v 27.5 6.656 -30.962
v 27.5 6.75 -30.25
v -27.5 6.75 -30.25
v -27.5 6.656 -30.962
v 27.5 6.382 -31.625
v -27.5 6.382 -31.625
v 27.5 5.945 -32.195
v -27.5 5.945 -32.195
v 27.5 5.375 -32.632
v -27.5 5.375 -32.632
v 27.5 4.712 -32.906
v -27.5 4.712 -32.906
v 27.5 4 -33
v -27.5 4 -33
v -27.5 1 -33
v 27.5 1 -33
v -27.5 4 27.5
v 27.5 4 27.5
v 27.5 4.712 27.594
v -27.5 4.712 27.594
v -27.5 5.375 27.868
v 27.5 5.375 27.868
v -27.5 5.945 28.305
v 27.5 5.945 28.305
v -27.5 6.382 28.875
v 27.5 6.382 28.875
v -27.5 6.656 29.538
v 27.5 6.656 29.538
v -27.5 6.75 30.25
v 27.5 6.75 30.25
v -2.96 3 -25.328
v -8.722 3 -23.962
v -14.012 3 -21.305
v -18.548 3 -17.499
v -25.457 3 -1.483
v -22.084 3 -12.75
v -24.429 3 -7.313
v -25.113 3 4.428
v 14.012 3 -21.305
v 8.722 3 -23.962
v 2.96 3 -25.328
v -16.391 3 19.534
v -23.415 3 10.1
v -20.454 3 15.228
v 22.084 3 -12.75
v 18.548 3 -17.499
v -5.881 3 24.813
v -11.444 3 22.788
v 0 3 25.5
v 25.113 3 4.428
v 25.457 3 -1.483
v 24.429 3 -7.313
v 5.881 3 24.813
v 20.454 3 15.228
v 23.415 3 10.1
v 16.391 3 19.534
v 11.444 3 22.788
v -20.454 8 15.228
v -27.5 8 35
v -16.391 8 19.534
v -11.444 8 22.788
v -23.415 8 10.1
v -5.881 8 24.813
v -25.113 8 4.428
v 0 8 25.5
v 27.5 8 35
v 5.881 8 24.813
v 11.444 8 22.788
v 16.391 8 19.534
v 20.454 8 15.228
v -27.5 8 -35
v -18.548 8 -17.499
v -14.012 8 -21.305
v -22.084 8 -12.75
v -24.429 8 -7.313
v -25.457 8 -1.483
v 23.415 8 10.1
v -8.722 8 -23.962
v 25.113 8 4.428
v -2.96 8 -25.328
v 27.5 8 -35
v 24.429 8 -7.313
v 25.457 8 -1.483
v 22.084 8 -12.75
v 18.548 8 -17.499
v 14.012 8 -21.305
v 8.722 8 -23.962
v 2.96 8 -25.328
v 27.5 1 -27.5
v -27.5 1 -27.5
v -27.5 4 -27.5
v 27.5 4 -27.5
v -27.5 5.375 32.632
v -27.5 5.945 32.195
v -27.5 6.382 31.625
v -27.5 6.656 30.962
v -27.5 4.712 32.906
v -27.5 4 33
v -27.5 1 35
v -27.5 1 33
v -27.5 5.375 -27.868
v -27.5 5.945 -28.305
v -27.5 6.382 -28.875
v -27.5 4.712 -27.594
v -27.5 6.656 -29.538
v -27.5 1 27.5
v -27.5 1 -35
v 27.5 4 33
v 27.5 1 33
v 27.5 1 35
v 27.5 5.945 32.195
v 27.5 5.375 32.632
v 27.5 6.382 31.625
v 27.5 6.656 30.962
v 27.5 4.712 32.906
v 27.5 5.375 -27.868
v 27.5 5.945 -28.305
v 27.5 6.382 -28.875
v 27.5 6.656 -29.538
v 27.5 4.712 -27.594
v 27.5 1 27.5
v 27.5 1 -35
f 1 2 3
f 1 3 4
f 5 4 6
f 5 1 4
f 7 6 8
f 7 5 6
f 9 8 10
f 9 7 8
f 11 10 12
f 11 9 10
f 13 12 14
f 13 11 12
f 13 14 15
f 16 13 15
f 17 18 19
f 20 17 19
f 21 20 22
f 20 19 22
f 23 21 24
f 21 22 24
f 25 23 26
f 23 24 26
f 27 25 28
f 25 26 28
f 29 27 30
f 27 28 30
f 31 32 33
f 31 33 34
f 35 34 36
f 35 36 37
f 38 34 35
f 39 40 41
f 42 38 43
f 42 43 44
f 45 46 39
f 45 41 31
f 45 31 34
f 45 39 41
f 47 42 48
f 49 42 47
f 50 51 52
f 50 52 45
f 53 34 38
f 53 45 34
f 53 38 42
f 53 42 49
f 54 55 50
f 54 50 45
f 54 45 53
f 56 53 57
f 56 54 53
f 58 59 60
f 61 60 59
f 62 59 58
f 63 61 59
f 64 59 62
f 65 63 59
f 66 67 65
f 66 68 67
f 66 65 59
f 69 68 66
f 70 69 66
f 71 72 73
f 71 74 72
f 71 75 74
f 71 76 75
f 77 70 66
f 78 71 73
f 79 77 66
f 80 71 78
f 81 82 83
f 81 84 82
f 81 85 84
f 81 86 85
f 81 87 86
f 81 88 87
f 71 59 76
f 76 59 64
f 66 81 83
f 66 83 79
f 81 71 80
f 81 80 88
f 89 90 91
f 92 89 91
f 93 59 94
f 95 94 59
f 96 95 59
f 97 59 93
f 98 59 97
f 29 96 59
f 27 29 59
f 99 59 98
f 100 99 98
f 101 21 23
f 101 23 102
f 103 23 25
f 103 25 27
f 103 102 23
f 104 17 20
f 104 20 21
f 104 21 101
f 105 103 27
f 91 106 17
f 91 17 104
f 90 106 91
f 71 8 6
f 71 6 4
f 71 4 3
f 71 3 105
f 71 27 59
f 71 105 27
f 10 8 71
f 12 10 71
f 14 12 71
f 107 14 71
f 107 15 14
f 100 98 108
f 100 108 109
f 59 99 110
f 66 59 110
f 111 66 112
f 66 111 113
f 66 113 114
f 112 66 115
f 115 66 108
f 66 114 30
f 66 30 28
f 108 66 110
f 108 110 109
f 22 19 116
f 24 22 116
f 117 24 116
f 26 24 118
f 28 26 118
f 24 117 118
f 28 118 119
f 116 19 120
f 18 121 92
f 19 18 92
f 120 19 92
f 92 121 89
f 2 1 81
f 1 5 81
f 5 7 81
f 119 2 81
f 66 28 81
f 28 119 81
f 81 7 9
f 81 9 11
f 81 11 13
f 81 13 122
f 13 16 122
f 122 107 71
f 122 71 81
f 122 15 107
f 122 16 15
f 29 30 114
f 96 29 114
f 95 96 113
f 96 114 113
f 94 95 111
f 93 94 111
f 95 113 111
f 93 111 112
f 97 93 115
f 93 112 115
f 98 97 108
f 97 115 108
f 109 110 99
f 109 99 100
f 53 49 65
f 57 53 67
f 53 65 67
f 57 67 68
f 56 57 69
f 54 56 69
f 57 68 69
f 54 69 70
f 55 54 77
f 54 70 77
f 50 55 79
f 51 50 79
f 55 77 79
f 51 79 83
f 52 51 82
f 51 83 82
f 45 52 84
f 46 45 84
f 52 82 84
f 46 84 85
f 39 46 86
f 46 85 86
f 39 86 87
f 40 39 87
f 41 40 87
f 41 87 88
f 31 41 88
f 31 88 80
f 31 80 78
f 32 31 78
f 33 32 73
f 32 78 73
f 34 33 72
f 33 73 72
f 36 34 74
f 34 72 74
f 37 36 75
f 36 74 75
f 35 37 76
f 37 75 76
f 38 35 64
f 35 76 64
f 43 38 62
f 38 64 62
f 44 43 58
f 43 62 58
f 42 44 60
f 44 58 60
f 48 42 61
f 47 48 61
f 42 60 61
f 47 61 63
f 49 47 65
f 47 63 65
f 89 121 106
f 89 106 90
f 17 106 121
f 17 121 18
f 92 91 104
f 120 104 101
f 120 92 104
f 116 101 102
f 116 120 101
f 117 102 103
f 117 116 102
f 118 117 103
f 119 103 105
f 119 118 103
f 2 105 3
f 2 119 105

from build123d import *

# Parameters (mm, degrees)
SKETCH2_W           = 55
SKETCH2_H           = 70
BOSS_EXTRUDE1_DEPTH = 8
SKETCH3_R           = 25.5
CUT_EXTRUDE1_DEPTH  = 5
CUT_EXTRUDE3_DEPTH  = 125
SKETCH6_W           = 70
SKETCH6_H           = 1
CUT_EXTRUDE4_DEPTH  = 125


with BuildPart() as part:
    # Sketch2 → Boss-Extrude1 (new body)
    with BuildSketch(Plane(origin=(0, 0, 0), x_dir=(1, 0, 0), z_dir=(0, 1, 0))):
        Rectangle(SKETCH2_W, SKETCH2_H)
    extrude(amount=BOSS_EXTRUDE1_DEPTH)

    # Sketch3 → Cut-Extrude1 (cut)
    with BuildSketch(Plane(origin=(0, 8, 0), x_dir=(1, 0, 0), z_dir=(0, 1, 0))):
        with Locations(Location((0, 0, 0), (0, 0, 270))):
            Circle(SKETCH3_R)
    extrude(amount=-CUT_EXTRUDE1_DEPTH, mode=Mode.SUBTRACT)

    # Sketch4 → Cut-Extrude3 (cut)
    with BuildSketch(Plane(origin=(27.5, 0, 0), x_dir=(0, 0, -1), z_dir=(1, 0, 0))):
        with BuildLine():
            Line((-30.25, 0), (-30.25, 1.25))
            ThreePointArc((-30.25, 1.25), (-32.194543648, 2.055456352), (-33, 4))
            Line((-33, 4), (-33, 0))
            Line((-33, 0), (-30.25, 0))
        make_face()
        with BuildLine():
            ThreePointArc((-27.5, 4), (-28.305456352, 2.055456352), (-30.25, 1.25))
            Line((-30.25, 1.25), (-30.25, 0))
            Line((-30.25, 0), (-27.5, 0))
            Line((-27.5, 0), (-27.5, 4))
        make_face()
        with BuildLine():
            ThreePointArc((-27.5, 4), (-28.305456352, 5.944543648), (-30.25, 6.75))
            Line((-30.25, 6.75), (-30.25, 1.25))
            ThreePointArc((-30.25, 1.25), (-28.305456352, 2.055456352), (-27.5, 4))
        make_face()
        with BuildLine():
            Line((-30.25, 1.25), (-30.25, 6.75))
            ThreePointArc((-30.25, 6.75), (-32.194543648, 5.944543648), (-33, 4))
            ThreePointArc((-33, 4), (-32.194543648, 2.055456352), (-30.25, 1.25))
        make_face()
    cut_extrude3 = extrude(amount=-CUT_EXTRUDE3_DEPTH, mode=Mode.SUBTRACT)

    # Mirror1: Cut-Extrude3 across plane
    add(cut_extrude3.mirror(Plane.XY), mode=Mode.SUBTRACT)

    # Sketch6 → Cut-Extrude4 (cut)
    with BuildSketch(Plane(origin=(27.5, 0, 0), x_dir=(0, 0, -1), z_dir=(1, 0, 0))):
        with Locations((0, 0.5)):
            Rectangle(SKETCH6_W, SKETCH6_H)
    extrude(amount=-CUT_EXTRUDE4_DEPTH, mode=Mode.SUBTRACT)


solid = part.part
